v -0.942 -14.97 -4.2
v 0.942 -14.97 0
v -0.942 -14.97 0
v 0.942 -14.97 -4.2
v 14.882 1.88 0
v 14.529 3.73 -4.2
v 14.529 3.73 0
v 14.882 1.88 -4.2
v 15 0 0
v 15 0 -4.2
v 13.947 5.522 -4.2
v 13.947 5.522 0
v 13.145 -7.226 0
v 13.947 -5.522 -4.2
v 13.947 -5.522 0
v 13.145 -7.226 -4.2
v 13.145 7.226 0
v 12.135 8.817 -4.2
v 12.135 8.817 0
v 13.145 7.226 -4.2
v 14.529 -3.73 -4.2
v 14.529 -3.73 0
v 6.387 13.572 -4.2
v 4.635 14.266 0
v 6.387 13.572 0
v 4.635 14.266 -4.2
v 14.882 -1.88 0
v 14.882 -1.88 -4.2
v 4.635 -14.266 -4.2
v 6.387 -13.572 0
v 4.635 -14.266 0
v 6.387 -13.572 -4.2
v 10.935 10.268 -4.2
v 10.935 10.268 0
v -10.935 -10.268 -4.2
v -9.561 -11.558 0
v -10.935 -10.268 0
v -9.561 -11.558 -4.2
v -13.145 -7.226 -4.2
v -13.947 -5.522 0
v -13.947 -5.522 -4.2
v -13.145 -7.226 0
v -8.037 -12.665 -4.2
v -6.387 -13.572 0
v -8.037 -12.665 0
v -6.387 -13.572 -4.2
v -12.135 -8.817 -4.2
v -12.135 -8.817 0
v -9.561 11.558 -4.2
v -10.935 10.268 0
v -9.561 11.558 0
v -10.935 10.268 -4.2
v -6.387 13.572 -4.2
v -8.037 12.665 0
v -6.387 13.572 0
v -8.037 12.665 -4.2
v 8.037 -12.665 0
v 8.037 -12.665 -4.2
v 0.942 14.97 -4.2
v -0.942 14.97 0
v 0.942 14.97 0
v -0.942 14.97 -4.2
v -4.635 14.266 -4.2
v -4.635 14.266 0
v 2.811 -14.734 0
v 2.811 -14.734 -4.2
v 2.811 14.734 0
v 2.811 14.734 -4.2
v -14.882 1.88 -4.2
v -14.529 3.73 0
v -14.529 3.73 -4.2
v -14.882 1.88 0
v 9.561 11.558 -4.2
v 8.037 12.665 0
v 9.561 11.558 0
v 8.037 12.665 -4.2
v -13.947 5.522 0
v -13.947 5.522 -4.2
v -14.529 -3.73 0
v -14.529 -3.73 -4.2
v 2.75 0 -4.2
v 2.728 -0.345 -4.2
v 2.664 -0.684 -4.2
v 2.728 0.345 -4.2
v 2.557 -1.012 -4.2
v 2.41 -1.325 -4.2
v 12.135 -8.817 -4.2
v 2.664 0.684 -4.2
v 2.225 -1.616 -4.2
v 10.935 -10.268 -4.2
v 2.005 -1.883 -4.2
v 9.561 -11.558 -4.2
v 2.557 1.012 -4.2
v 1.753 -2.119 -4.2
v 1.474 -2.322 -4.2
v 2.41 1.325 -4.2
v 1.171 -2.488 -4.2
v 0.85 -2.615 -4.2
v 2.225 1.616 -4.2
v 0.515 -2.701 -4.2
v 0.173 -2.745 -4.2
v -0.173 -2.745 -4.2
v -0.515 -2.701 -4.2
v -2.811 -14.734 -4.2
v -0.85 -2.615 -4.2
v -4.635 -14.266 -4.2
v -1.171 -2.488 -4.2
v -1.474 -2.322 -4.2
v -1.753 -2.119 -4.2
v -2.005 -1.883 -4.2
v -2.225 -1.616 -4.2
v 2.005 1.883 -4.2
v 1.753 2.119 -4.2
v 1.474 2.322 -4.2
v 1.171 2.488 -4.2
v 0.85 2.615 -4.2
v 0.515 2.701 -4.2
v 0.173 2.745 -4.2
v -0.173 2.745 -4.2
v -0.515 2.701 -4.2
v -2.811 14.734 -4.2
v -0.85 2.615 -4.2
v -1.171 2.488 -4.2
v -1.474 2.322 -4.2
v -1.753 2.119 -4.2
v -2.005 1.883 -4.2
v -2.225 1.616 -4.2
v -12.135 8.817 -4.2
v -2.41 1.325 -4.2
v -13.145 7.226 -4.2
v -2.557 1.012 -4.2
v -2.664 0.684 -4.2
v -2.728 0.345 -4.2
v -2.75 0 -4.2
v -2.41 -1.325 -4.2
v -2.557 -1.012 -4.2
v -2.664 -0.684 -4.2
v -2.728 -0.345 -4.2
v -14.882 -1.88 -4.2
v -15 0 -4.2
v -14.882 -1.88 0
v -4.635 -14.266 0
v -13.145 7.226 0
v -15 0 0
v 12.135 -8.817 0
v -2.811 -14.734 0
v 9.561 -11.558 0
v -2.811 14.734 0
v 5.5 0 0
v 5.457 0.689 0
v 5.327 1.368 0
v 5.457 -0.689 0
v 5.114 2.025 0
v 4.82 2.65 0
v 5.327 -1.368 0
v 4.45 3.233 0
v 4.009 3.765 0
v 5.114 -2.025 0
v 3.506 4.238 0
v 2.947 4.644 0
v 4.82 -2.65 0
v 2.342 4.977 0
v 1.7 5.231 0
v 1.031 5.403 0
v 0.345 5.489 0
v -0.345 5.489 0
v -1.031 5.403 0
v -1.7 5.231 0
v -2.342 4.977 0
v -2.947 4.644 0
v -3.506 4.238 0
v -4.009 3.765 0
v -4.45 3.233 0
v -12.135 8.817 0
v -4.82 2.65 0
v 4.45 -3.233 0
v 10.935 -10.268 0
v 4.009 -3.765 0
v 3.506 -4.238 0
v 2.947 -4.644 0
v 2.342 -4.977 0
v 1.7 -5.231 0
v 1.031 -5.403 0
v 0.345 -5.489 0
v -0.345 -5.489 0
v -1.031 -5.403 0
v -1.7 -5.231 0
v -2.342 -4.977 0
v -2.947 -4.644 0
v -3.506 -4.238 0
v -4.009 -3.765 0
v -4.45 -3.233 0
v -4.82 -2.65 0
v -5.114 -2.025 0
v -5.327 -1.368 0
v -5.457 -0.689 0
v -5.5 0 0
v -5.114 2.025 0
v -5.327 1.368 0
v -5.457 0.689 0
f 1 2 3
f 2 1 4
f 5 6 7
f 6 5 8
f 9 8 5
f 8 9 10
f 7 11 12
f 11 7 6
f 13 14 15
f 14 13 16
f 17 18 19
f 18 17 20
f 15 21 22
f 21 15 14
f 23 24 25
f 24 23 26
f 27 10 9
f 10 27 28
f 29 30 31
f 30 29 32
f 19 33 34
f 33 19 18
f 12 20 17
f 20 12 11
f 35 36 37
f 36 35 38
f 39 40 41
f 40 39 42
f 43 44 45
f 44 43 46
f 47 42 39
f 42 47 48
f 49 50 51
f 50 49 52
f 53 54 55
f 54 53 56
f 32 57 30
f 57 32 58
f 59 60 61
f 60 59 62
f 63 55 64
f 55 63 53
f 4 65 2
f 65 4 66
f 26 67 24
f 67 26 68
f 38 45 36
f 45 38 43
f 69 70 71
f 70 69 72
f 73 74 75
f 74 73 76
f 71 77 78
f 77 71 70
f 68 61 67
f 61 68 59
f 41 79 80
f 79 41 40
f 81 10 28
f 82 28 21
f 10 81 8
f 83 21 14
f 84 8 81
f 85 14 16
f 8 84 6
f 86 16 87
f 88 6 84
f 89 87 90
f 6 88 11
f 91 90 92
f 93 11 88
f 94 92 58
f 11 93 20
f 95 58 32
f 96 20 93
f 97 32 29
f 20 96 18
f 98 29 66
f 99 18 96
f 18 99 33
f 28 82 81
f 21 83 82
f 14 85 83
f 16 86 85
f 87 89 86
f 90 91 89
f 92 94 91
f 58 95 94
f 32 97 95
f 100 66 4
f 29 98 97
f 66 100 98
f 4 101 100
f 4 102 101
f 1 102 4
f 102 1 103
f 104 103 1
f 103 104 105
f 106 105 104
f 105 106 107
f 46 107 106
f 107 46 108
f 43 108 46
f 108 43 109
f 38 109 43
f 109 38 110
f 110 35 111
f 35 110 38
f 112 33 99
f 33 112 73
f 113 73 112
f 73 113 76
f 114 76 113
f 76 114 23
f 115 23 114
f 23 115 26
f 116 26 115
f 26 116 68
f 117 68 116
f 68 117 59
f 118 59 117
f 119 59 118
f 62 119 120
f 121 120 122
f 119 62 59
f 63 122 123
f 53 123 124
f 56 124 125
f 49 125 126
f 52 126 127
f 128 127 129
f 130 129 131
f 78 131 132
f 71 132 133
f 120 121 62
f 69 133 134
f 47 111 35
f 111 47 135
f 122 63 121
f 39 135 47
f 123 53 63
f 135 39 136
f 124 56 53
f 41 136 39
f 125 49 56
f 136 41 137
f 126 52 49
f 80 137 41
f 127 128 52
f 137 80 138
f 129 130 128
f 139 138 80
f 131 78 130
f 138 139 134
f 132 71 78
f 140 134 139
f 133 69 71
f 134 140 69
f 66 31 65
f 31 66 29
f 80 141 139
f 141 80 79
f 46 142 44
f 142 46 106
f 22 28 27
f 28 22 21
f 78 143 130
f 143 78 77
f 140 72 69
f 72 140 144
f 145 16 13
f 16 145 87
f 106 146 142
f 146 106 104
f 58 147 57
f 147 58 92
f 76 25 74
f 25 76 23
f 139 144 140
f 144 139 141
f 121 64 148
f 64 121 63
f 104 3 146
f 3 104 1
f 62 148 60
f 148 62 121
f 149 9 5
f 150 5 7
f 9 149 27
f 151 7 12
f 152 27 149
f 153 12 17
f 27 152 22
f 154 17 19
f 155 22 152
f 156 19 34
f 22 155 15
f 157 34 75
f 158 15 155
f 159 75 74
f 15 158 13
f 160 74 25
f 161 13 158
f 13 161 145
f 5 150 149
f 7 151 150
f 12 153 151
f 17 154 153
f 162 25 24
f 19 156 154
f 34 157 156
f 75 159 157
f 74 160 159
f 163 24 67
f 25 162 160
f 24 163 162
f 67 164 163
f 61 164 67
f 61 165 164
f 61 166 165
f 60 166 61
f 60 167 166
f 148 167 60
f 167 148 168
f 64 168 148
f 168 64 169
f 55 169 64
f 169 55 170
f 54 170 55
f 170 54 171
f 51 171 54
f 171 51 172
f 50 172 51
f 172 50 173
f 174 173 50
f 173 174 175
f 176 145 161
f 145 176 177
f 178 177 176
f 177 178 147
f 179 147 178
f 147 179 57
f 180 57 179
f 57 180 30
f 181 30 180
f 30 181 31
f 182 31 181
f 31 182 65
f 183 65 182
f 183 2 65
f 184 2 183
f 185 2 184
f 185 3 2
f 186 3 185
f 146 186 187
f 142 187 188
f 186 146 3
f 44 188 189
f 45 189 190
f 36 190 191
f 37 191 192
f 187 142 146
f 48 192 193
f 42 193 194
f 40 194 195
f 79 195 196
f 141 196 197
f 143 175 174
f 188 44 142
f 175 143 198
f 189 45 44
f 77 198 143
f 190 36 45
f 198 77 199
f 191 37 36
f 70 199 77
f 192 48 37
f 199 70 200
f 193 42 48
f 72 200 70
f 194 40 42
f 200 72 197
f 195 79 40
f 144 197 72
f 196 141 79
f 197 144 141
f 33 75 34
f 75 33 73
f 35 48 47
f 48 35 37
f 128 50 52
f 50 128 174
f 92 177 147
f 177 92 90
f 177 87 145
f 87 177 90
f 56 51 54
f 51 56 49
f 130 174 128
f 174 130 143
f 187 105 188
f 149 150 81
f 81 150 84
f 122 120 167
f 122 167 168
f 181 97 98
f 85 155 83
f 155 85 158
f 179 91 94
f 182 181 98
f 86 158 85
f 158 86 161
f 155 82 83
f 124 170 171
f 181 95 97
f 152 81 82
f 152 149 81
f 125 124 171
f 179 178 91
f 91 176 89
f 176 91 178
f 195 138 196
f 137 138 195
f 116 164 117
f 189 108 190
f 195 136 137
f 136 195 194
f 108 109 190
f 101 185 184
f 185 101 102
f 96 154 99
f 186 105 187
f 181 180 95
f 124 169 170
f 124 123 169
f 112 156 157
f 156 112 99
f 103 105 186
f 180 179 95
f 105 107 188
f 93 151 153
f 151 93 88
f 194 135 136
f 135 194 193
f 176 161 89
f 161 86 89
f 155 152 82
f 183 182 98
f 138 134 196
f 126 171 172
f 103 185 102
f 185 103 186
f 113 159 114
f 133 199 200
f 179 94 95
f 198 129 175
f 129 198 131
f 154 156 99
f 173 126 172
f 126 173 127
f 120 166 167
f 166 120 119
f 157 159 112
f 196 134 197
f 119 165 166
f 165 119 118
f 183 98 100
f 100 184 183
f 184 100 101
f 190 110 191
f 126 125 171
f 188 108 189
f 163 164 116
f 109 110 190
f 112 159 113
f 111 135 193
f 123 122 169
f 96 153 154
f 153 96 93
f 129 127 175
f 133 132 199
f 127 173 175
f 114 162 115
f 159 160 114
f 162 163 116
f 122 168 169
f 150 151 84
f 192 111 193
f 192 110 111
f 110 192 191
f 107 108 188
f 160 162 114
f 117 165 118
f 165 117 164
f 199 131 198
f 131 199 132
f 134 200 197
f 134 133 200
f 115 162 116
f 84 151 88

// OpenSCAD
$fn = 50;


difference() {
	union() {
		translate(v = [0, 0, -4.2000000000]) {
			cylinder(h = 4.2000000000, r = 15.0000000000);
		}
		translate(v = [0, 0, -4.2000000000]) {
			cylinder(h = 4.2000000000, r = 2.8750000000);
		}
	}
	union() {
		translate(v = [0, 0, 0]) {
			rotate(a = [0, 0, 0]) {
				difference() {
					union() {
						translate(v = [0, 0, -4.2000000000]) {
							cylinder(h = 4.2000000000, r = 2.2500000000);
						}
						translate(v = [0, 0, -4.2000000000]) {
							cylinder(h = 4.2000000000, r1 = 2.7500000000, r2 = 5.5000000000);
						}
						translate(v = [0, 0, -4.2000000000]) {
							cylinder(h = 4.2000000000, r = 2.7500000000);
						}
						translate(v = [0, 0, -4.2000000000]) {
							cylinder(h = 4.2000000000, r = 2.2500000000);
						}
					}
					union();
				}
			}
		}
	}
}
